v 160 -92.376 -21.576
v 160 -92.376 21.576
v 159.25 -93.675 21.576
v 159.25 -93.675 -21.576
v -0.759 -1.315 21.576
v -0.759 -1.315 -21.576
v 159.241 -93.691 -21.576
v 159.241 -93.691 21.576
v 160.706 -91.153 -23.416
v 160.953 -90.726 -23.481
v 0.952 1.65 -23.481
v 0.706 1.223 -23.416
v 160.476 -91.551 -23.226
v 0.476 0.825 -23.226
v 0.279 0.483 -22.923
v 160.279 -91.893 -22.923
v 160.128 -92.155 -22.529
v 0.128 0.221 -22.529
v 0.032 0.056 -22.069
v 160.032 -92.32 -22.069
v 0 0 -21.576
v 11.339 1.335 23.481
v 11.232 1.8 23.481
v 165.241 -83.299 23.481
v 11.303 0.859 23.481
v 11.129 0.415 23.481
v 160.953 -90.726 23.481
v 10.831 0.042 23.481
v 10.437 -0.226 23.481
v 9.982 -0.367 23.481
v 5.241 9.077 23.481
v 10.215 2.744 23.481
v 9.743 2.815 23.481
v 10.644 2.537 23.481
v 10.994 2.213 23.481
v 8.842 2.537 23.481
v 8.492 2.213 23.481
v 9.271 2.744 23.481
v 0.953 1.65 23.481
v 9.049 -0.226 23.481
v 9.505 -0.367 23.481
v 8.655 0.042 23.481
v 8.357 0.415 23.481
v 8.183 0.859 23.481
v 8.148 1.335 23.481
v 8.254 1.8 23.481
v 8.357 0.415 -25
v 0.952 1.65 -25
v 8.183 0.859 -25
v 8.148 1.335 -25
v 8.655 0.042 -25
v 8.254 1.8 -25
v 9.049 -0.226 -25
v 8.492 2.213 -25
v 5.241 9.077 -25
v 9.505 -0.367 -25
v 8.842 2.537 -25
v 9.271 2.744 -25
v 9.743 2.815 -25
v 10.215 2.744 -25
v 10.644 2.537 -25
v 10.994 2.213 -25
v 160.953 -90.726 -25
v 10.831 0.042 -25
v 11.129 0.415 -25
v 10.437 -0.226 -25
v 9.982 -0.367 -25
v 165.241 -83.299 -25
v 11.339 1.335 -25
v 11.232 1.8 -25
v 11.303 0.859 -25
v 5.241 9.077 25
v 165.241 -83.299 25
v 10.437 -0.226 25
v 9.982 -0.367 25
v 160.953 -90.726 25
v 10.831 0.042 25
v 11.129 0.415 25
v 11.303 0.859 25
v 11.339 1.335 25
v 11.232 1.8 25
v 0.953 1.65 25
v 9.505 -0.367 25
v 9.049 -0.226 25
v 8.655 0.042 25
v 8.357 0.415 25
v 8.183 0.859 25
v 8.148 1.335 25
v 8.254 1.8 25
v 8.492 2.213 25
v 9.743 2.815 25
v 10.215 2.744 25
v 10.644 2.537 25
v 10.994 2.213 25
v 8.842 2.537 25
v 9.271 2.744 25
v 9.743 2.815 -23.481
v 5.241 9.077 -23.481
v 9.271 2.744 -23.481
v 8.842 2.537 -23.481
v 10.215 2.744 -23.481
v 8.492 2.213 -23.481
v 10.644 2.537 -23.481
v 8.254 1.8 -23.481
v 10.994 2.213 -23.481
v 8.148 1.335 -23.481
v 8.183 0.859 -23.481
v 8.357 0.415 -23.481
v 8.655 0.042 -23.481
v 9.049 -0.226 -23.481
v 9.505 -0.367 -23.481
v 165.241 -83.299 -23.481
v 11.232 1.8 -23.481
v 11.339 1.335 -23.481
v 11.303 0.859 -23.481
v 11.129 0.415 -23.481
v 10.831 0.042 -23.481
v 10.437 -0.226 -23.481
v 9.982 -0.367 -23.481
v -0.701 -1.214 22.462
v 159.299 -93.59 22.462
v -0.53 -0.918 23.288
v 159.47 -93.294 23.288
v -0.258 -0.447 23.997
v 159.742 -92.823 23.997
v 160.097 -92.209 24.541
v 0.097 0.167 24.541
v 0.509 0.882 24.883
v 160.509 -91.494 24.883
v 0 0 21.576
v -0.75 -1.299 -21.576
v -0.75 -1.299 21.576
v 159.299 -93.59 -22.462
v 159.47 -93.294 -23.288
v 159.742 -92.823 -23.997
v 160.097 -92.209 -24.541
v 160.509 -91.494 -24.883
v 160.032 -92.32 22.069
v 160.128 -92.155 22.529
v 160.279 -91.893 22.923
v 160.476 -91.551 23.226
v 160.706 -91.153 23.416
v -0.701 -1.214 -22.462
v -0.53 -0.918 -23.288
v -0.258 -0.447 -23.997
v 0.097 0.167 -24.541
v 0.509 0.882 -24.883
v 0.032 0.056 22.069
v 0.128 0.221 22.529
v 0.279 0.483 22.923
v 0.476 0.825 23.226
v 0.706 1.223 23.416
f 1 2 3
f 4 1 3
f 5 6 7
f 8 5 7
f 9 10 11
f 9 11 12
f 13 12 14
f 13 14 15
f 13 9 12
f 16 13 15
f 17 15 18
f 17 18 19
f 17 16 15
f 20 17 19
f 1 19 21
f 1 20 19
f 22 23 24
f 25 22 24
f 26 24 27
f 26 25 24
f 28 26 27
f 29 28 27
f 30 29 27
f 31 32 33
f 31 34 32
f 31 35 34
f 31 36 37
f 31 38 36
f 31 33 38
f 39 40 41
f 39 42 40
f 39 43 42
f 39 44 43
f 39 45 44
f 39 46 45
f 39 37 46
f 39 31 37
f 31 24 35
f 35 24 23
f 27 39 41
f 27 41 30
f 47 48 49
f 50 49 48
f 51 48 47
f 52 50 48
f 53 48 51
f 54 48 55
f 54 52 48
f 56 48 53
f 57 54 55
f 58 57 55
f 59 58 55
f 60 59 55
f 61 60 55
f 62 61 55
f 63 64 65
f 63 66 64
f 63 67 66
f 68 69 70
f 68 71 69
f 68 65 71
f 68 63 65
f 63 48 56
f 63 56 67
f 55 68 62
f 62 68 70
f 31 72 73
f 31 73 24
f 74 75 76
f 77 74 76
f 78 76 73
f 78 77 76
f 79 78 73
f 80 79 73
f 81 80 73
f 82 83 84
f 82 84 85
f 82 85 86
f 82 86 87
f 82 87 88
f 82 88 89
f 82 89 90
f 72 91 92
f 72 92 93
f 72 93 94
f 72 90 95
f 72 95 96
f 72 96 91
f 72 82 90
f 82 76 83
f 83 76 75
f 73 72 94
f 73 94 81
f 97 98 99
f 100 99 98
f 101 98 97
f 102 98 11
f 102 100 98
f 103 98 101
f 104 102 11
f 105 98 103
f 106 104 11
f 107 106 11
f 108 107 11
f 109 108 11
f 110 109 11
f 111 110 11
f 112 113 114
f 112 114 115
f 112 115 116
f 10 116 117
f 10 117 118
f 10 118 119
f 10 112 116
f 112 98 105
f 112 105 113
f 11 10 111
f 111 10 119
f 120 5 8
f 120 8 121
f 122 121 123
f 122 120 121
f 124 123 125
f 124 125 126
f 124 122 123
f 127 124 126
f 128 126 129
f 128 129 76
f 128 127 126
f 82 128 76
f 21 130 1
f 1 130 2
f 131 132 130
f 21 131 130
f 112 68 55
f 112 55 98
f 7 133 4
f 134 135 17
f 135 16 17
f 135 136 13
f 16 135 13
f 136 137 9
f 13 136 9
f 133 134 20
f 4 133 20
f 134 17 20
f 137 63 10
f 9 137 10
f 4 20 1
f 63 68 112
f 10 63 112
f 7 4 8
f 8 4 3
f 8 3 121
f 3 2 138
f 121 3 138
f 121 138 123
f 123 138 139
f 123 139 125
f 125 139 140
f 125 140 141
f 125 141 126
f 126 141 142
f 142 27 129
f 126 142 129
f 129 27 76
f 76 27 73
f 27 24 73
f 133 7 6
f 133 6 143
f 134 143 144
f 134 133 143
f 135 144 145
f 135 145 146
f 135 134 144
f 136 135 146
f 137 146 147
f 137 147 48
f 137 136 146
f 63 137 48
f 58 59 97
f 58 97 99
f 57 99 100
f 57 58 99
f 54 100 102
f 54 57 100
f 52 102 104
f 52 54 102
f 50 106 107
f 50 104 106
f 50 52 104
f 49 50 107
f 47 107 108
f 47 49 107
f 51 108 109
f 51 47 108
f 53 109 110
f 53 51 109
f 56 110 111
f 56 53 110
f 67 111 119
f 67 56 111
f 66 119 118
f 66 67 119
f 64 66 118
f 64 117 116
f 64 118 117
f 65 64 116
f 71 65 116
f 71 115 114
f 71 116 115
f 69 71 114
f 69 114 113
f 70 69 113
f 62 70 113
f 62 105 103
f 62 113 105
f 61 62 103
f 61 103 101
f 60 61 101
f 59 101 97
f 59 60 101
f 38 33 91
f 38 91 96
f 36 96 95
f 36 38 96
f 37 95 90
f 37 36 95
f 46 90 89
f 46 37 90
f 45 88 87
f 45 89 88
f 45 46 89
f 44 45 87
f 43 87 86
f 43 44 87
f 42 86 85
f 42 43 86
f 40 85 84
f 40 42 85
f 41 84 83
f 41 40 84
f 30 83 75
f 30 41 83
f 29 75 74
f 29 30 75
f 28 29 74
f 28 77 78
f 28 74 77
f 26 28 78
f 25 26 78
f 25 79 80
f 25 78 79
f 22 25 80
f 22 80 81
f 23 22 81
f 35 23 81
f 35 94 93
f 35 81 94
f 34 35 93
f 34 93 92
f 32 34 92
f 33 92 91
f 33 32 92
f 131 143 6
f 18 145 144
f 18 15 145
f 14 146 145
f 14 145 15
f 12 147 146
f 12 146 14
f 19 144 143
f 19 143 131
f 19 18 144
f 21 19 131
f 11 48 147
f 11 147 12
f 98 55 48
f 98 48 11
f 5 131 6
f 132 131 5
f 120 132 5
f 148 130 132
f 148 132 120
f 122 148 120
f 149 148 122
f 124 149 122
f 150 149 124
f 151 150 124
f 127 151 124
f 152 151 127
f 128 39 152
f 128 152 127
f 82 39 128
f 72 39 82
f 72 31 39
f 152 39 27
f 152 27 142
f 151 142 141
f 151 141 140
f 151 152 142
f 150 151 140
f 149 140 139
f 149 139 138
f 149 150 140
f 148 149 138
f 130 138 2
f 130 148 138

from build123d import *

# Parameters (mm, degrees)
BOSS_EXTRUDE1_DEPTH            = 25
CONVERT_SOLID1_START           = -1.51892
CONVERT_SOLID1_OUTLINE_W       = 184.752086141
CONVERT_SOLID1_OUTLINE_H       = 50
CONVERT_SOLID1_DEPTH           = 0.01892
EDGE_FLANGE1_STRIP_W           = 9.88568
EDGE_FLANGE1_STRIP_H           = 1.51892
EDGE_FLANGE1_STRIP_CUT_DEPTH   = 184.752086141
EDGE_FLANGE1_STRIP_2_W         = 9.88568
EDGE_FLANGE1_STRIP_2_H         = 1.51892
EDGE_FLANGE1_STRIP_CUT_2_DEPTH = 184.752086141
EDGE_FLANGE1_DEPTH             = 184.752086141
EDGE_FLANGE1_BEND_DEPTH        = 184.752086141
CUT_EXTRUDE2_DEPTH             = 197.424354221
CUT_EXTRUDE2_DEPTH_BACK        = 197.424354221
SKETCH13_R                     = 1.6


# Read off the part's stored shape, not the designer's step: Convert-Solid1
# Sheet-metal steps are written as plain solids
with BuildPart() as part:
    # Sketch2 → Boss-Extrude1 (new, symmetric)
    with BuildSketch(Plane.XY):
        Polygon((0, 0), (160, -92.37604307), (159.25, -93.675081176), (-0.75, -1.299038106), align=None)
    extrude(amount=BOSS_EXTRUDE1_DEPTH, both=True)

    # Convert-Solid1 outline → Convert-Solid1 (add)
    with BuildSketch(Plane(origin=(0, 0, 0), x_dir=(0.866025403784438, -0.500000000000001, 0), z_dir=(0.500000000000001, 0.866025403784438, 0)).offset(CONVERT_SOLID1_START)):
        with Locations((92.376043071, 0)):
            Rectangle(CONVERT_SOLID1_OUTLINE_W, CONVERT_SOLID1_OUTLINE_H)
    extrude(amount=CONVERT_SOLID1_DEPTH)

    # Edge-Flange1 strip (across the edge) → Edge-Flange1 strip cut (cut)
    with BuildSketch(Plane(origin=(160, -92.37604307, -25), x_dir=(0, 0, 1), z_dir=(-0.866025403784438, 0.5000000000000011, 0))):
        with Locations((-1.51892, -0.75946)):
            Rectangle(EDGE_FLANGE1_STRIP_W, EDGE_FLANGE1_STRIP_H)
    extrude(amount=EDGE_FLANGE1_STRIP_CUT_DEPTH, mode=Mode.SUBTRACT)

    # Edge-Flange1 strip 2 (across the edge) → Edge-Flange1 strip cut 2 (cut)
    with BuildSketch(Plane(origin=(0, 0, 25), x_dir=(0, 0, -1), z_dir=(0.866025403784438, -0.5000000000000011, 0))):
        with Locations((-1.51892, -0.75946)):
            Rectangle(EDGE_FLANGE1_STRIP_2_W, EDGE_FLANGE1_STRIP_2_H)
    extrude(amount=EDGE_FLANGE1_STRIP_CUT_2_DEPTH, mode=Mode.SUBTRACT)

    # Edge-Flange1 section (across the edge) → Edge-Flange1 (add)
    with BuildSketch(Plane(origin=(160, -92.37604307, -25), x_dir=(0, 0, 1), z_dir=(-0.866025403784438, 0.5000000000000011, 0))):
        with BuildLine():
            Line((0, 1.905), (0, 10.48108))
            Line((0, 10.48108), (1.51892, 10.48108))
            Line((1.51892, 10.48108), (1.51892, 1.905))
            ThreePointArc((1.51892, 1.905), (2.076881582, 0.557961582), (3.42392, 0))
            Line((3.42392, 0), (3.42392, -1.51892))
            ThreePointArc((3.42392, -1.51892), (1.00284295, -0.51607705), (0, 1.905))
        make_face()
    extrude(amount=EDGE_FLANGE1_DEPTH)

    # Edge-Flange1 section 2 (across the edge) → Edge-Flange1 bend (add)
    with BuildSketch(Plane(origin=(0, 0, 25), x_dir=(0, 0, -1), z_dir=(0.866025403784438, -0.5000000000000011, 0))):
        with BuildLine():
            Line((0, 1.905), (0, 10.48108))
            Line((0, 10.48108), (1.51892, 10.48108))
            Line((1.51892, 10.48108), (1.51892, 1.905))
            ThreePointArc((1.51892, 1.905), (2.076881582, 0.557961582), (3.42392, 0))
            Line((3.42392, 0), (3.42392, -1.51892))
            ThreePointArc((3.42392, -1.51892), (1.00284295, -0.51607705), (0, 1.905))
        make_face()
    extrude(amount=EDGE_FLANGE1_BEND_DEPTH)

    # Sketch13 → Cut-Extrude2 (cut, two sides: drawn at the far end of the back side and taken through both)
    with BuildSketch(Plane.XY.offset(25).offset(-CUT_EXTRUDE2_DEPTH_BACK)):
        with Locations(Location((9.743082385, 1.215259675, 0), (0, 0, 90))):
            Circle(SKETCH13_R)
    extrude(amount=CUT_EXTRUDE2_DEPTH + CUT_EXTRUDE2_DEPTH_BACK, mode=Mode.SUBTRACT)


solid = part.part
